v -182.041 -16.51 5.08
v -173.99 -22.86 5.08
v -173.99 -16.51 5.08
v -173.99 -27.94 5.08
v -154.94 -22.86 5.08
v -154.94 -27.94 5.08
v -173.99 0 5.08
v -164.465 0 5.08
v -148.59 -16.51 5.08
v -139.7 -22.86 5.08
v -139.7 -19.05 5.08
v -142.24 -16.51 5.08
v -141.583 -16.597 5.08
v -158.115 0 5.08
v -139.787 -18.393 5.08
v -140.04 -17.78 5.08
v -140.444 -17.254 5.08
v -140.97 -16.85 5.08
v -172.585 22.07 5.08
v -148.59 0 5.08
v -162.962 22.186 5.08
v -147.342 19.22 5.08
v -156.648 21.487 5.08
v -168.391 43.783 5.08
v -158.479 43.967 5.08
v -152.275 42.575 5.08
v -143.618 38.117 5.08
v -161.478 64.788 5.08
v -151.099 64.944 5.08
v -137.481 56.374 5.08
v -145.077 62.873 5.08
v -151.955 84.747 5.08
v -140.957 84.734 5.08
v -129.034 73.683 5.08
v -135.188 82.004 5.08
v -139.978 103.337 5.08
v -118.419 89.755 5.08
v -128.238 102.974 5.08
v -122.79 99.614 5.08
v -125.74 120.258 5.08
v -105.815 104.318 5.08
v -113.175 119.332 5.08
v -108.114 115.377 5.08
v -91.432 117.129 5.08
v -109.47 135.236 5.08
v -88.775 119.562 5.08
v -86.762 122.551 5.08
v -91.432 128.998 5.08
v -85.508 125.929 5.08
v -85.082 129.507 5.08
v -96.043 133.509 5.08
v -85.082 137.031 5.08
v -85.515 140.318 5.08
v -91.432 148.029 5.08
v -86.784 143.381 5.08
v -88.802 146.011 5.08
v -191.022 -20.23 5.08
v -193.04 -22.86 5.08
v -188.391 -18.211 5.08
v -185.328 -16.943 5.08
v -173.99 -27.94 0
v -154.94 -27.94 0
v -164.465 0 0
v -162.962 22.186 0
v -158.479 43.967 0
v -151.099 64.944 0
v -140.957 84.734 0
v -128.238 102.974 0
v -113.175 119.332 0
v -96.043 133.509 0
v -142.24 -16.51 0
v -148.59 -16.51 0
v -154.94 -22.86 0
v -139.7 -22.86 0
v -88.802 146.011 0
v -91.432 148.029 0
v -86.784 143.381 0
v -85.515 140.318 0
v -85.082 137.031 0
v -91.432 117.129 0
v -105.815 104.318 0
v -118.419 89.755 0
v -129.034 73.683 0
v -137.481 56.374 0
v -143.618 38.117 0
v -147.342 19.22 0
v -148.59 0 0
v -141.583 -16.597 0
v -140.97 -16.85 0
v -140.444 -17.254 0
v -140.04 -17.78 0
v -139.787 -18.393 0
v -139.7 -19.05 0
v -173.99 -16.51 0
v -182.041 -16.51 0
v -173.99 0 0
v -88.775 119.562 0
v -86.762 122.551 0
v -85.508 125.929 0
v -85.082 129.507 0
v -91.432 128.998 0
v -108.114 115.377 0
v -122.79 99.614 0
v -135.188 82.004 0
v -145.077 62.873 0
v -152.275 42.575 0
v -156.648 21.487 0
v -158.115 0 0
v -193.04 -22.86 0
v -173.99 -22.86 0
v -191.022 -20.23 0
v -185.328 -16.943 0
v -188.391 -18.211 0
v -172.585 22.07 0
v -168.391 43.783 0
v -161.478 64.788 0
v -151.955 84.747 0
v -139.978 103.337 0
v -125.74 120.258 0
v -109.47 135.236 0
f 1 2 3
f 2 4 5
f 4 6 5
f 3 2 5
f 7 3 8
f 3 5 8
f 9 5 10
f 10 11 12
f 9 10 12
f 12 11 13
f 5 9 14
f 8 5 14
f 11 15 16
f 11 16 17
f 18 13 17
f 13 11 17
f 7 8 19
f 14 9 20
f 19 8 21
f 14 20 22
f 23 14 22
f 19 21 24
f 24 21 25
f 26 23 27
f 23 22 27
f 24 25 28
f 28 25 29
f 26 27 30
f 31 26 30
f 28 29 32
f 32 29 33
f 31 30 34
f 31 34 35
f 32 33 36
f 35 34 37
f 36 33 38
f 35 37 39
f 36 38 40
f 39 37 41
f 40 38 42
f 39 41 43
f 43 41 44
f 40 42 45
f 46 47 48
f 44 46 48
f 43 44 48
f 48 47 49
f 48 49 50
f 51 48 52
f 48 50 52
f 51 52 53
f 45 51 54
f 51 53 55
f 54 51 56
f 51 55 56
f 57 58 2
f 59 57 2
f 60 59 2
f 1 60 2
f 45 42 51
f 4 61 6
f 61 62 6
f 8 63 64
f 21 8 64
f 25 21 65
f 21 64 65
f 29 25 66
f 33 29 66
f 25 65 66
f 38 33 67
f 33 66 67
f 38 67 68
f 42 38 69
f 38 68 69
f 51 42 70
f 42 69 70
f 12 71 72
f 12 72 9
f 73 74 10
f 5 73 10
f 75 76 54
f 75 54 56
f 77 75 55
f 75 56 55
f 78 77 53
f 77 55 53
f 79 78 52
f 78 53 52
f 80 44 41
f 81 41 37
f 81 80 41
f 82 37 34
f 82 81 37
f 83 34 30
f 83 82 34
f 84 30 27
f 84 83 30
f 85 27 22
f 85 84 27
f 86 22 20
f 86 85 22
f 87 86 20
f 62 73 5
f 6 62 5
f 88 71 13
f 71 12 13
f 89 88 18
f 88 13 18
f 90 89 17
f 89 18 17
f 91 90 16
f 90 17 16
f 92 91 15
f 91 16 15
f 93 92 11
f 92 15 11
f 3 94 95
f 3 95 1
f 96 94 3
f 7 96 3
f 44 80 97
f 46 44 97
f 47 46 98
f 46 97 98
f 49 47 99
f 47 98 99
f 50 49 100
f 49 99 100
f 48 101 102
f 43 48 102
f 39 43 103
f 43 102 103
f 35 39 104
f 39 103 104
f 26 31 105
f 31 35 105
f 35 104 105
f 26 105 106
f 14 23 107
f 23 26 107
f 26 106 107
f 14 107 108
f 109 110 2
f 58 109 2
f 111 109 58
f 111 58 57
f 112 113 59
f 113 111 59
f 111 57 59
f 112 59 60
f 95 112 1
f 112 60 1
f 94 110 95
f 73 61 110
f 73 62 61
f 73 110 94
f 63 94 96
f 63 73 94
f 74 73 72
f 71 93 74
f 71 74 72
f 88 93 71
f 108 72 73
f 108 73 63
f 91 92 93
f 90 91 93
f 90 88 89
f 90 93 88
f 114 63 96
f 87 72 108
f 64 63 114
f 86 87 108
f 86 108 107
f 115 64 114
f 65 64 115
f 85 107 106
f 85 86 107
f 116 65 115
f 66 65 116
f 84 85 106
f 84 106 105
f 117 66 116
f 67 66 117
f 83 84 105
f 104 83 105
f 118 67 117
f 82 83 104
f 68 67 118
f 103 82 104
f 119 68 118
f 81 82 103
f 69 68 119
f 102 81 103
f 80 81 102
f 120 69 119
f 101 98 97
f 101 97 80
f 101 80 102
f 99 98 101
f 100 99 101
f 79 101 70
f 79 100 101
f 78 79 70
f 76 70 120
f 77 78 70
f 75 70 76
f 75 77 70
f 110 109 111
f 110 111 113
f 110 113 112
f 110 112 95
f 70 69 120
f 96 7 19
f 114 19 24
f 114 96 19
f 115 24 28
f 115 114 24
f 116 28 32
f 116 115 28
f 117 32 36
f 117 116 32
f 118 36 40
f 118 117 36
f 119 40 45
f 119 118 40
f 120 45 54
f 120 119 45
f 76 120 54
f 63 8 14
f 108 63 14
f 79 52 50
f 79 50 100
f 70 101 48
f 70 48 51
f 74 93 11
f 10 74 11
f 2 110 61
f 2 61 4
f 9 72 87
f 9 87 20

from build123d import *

# Parameters (mm, degrees)
EXTRUDE_THIN2_DEPTH          = 5.08
CUT_EXTRUDE_THIN3_DEPTH      = 247.111451582
CUT_EXTRUDE_THIN3_DEPTH_BACK = 5.08
SKETCH9_W                    = 25.4
SKETCH9_H                    = 5.08
BOSS_EXTRUDE3_DEPTH          = 22.86
BOSS_EXTRUDE4_DEPTH          = 19.05
BOSS_EXTRUDE4_DEPTH_BACK     = 34.29
SKETCH10_W                   = 5.08
SKETCH10_H                   = 6.35
SKETCH11_W                   = 12.7
SKETCH11_H                   = 5.08
BOSS_EXTRUDE5_DEPTH          = 5.08
SKETCH12_W                   = 168.813467259
SKETCH12_H                   = 220.237806267
CUT_EXTRUDE1_DEPTH           = 260.928390331
SKETCH13_W                   = 5.08
SKETCH13_H                   = 30.900567514
BOSS_EXTRUDE6_DEPTH          = 6.35
FILLET2_R                    = 15.24
FILLET3_R                    = 12.7
FILLET4_R                    = 12.7
FILLET5_R                    = 2.54
BOSS_EXTRUDE14_DEPTH         = 5.08
SKETCH16_W                   = 5.08
SKETCH16_H                   = 5.08
BOSS_EXTRUDE15_DEPTH         = 6.35


with BuildPart() as part:
    # Sketch7 → Extrude-Thin2 (new body)
    with BuildSketch(Plane.XY):
        with BuildLine():
            ThreePointArc((-173.99, 0), (-123.029508859, 123.029508859), (0, 173.99))
            Line((0, 173.99), (0, 148.59))
            ThreePointArc((0, 148.59), (-105.068996617, 105.068996617), (-148.59, 0))
            Line((-148.59, 0), (-173.99, 0))
        make_face()
    extrude(amount=EXTRUDE_THIN2_DEPTH)

    # Sketch8 → Cut-Extrude-Thin3 (cut, two sides: drawn at the far end of the back side and taken through both)
    with BuildSketch(Plane.XY.offset(5.08).offset(-CUT_EXTRUDE_THIN3_DEPTH_BACK)):
        with BuildLine():
            ThreePointArc((-164.465, 0), (-116.294316768, 116.294316768), (0, 164.465))
            Line((0, 164.465), (0, 158.115))
            ThreePointArc((0, 158.115), (-111.804188707, 111.804188707), (-158.115, 0))
            Line((-158.115, 0), (-164.465, 0))
        make_face()
    extrude(amount=CUT_EXTRUDE_THIN3_DEPTH + CUT_EXTRUDE_THIN3_DEPTH_BACK, mode=Mode.SUBTRACT)


with BuildPart() as cut_extrude_thin3_piece_1:
    # of the separate pieces the step leaves, piece 1, a body of its own (cut_extrude_thin3_pieces)
    add(part.part.solids().sort_by_distance((0, 173.99, 0))[0])



with BuildPart() as cut_extrude_thin3_piece_2:
    # of the separate pieces the step leaves, piece 2, a body of its own (cut_extrude_thin3_pieces)
    add(part.part.solids().sort_by_distance((0, 158.115, 0))[0])


with BuildPart() as cut_extrude_thin3_piece_1_1:
    add(cut_extrude_thin3_piece_1.part)

    add(cut_extrude_thin3_piece_2.part)  # Boss-Extrude3 merges Cut-Extrude-Thin3 piece 2
    # Sketch9 → Boss-Extrude3 (add)
    with BuildSketch(Plane.XZ):
        with Locations((-161.29, 2.54)):
            Rectangle(SKETCH9_W, SKETCH9_H)
    extrude(amount=BOSS_EXTRUDE3_DEPTH)

    # Sketch10 → Boss-Extrude4 (add, two sides: drawn at the far end of the back side and taken through both)
    with BuildSketch(Plane.ZY.offset(173.99).offset(-BOSS_EXTRUDE4_DEPTH_BACK)):
        with Locations((2.54, -19.685)):
            Rectangle(SKETCH10_W, SKETCH10_H)
    extrude(amount=BOSS_EXTRUDE4_DEPTH + BOSS_EXTRUDE4_DEPTH_BACK)

    # Sketch11 → Boss-Extrude5 (add)
    with BuildSketch(Plane.XZ.offset(22.86)):
        with Locations((-161.29, 2.54)):
            Rectangle(SKETCH11_W, SKETCH11_H)
    extrude(amount=BOSS_EXTRUDE5_DEPTH)

    # Sketch12 → Cut-Extrude1 (cut, through all)
    with BuildSketch(Plane.XY.offset(5.08)):
        with Locations((-7.025506372, 87.258903133)):
            Rectangle(SKETCH12_W, SKETCH12_H)
    extrude(amount=-CUT_EXTRUDE1_DEPTH, mode=Mode.SUBTRACT)

    # Sketch13 → Boss-Extrude6 (add)
    with BuildSketch(Plane(origin=(-91.432240001, 0, 0), x_dir=(0, 0, -1), z_dir=(1, 0, 0))):
        with Locations((-2.54, 132.578988985)):
            Rectangle(SKETCH13_W, SKETCH13_H)
    extrude(amount=BOSS_EXTRUDE6_DEPTH)

    # Fillet2
    # the kernel refuses this fillet: 15.24 mm, written as the material it takes off along each edge
    with BuildSketch(Plane(origin=(-85.082240001, 117.128705228, -30.946072045), x_dir=(-1, 0, 0), z_dir=(0, 0, 1))) as fillet2_piece_1:
        with BuildLine():
            CenterArc((15.24, -12.378428818), FILLET2_R, 125.685334713, 54.314665287)
            Line((0, -12.378428818), (-0.3048, -12.378428818))
            Line((-0.3048, -12.378428818), (-0.3048, 0))
            Line((-0.3048, 0), (0, 0.3048))
            ThreePointArc((0, 0.3048), (3.175, 0.3048), (6.1722, 0.247568576))
            Line((6.1722, 0.247568576), (6.35, 0))
        make_face()
    extrude(amount=66.97214409, mode=Mode.SUBTRACT)

    # Fillet3
    # the kernel refuses this fillet: 12.7 mm, written as the material it takes off along each edge
    with BuildSketch(Plane(origin=(-85.082240001, 148.029272742, 32.57630657), x_dir=(0, -1, 0), z_dir=(0, 0, -1))) as fillet3_piece_1:
        with BuildLine():
            CenterArc((10.998522628, 12.7), FILLET3_R, 210, 60)
            Line((0, 6.35), (-0.219970453, 6.223))
            ThreePointArc((-0.219970453, 6.223), (-0.254, 3.175), (-0.254, 0))
            Line((-0.254, 0), (0, -0.254))
            Line((0, -0.254), (10.998522628, -0.254))
            Line((10.998522628, -0.254), (10.998522628, 0))
        make_face()
    extrude(amount=60.07261314, mode=Mode.SUBTRACT)

    # Fillet4
    # the kernel refuses this fillet: 12.7 mm, written as the material it takes off along each edge
    with BuildSketch(Plane(origin=(-193.04, -16.51, 32.57630657), x_dir=(1, 0, 0), z_dir=(0, 0, -1))) as fillet4_piece_1:
        with BuildLine():
            CenterArc((10.998522628, 12.7), FILLET4_R, 210, 60)
            Line((0, 6.35), (-0.219970453, 6.223))
            ThreePointArc((-0.219970453, 6.223), (-0.254, 3.175), (-0.254, 0))
            Line((-0.254, 0), (0, -0.254))
            Line((0, -0.254), (10.998522628, -0.254))
            Line((10.998522628, -0.254), (10.998522628, 0))
        make_face()
    extrude(amount=60.07261314, mode=Mode.SUBTRACT)

    # Fillet5
    fillet5_edges = [cut_extrude_thin3_piece_1_1.edges().sort_by_distance(p)[0] for p in [
        (-139.7, -16.51, 2.54),
    ]]
    fillet(fillet5_edges, radius=FILLET5_R)

    # Sketch15 → Boss-Extrude14 (add)
    with BuildSketch(Plane.XY):
        Polygon((-91.432240001, 128.998057014), (-96.042586765, 133.508642988), (-90.011669105, 142.911064998), (-86.217351324, 133.783124359), align=None)
    extrude(amount=BOSS_EXTRUDE14_DEPTH)

    # Sketch16 → Boss-Extrude15 (add)
    with BuildSketch(Plane.ZY.offset(167.64)):
        with Locations((2.54, -25.4)):
            Rectangle(SKETCH16_W, SKETCH16_H)
    extrude(amount=BOSS_EXTRUDE15_DEPTH)


solid = cut_extrude_thin3_piece_1_1.part
